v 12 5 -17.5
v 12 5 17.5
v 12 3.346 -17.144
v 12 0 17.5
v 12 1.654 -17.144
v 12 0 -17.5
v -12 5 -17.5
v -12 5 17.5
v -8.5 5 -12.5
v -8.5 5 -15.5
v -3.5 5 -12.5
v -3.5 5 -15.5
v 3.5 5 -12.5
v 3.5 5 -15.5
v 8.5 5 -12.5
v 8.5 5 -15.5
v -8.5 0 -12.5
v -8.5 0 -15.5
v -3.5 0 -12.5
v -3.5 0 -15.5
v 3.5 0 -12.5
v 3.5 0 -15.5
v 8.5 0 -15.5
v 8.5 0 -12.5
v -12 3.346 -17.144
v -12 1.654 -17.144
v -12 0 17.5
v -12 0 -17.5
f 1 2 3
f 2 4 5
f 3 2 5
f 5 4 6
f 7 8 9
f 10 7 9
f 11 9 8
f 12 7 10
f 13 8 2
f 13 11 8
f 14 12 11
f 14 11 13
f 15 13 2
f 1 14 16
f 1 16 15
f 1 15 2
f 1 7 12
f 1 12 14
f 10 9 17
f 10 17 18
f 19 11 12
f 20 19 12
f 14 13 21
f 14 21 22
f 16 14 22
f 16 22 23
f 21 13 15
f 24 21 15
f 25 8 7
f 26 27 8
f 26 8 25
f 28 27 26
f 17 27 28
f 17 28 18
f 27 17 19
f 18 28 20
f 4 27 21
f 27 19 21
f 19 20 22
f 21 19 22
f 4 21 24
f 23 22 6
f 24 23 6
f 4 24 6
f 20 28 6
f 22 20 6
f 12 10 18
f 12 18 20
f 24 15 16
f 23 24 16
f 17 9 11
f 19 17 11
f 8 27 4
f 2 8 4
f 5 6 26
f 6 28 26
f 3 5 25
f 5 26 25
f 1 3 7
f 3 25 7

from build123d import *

# Parameters (mm, degrees)
SCHIZZO2_W                 = 24
SCHIZZO2_H                 = 35
BASESUPPORTO_DEPTH         = 5
SCHIZZO3_R                 = 8
APPOGGIOALLONGHERONE_DEPTH = 31.120590964
SCHIZZO4_W                 = 5
SCHIZZO4_H                 = 3
FORIFASCETTE_DEPTH         = 22.800229357


with BuildPart() as part:
    # Schizzo2 → BaseSupporto (new body)
    with BuildSketch(Plane(origin=(0, 0, 0), x_dir=(1, 0, 0), z_dir=(0, 1, 0))):
        Rectangle(SCHIZZO2_W, SCHIZZO2_H)
    extrude(amount=BASESUPPORTO_DEPTH)

    # Schizzo3 → AppoggioAlLongherone (cut, through all)
    with BuildSketch(Plane.ZY.offset(12)):
        with Locations((-25.099342077, 2.5)):
            Circle(SCHIZZO3_R)
    extrude(amount=-APPOGGIOALLONGHERONE_DEPTH, mode=Mode.SUBTRACT)

    # Schizzo4 → ForiFascette (cut, through all)
    with BuildSketch(Plane(origin=(0, 5, 0), x_dir=(1, 0, 0), z_dir=(0, 1, 0))):
        with Locations((-6, 14)):
            Rectangle(SCHIZZO4_W, SCHIZZO4_H)
        with Locations((6, 14)):
            Rectangle(SCHIZZO4_W, SCHIZZO4_H)
    extrude(amount=-FORIFASCETTE_DEPTH, mode=Mode.SUBTRACT)


solid = part.part
